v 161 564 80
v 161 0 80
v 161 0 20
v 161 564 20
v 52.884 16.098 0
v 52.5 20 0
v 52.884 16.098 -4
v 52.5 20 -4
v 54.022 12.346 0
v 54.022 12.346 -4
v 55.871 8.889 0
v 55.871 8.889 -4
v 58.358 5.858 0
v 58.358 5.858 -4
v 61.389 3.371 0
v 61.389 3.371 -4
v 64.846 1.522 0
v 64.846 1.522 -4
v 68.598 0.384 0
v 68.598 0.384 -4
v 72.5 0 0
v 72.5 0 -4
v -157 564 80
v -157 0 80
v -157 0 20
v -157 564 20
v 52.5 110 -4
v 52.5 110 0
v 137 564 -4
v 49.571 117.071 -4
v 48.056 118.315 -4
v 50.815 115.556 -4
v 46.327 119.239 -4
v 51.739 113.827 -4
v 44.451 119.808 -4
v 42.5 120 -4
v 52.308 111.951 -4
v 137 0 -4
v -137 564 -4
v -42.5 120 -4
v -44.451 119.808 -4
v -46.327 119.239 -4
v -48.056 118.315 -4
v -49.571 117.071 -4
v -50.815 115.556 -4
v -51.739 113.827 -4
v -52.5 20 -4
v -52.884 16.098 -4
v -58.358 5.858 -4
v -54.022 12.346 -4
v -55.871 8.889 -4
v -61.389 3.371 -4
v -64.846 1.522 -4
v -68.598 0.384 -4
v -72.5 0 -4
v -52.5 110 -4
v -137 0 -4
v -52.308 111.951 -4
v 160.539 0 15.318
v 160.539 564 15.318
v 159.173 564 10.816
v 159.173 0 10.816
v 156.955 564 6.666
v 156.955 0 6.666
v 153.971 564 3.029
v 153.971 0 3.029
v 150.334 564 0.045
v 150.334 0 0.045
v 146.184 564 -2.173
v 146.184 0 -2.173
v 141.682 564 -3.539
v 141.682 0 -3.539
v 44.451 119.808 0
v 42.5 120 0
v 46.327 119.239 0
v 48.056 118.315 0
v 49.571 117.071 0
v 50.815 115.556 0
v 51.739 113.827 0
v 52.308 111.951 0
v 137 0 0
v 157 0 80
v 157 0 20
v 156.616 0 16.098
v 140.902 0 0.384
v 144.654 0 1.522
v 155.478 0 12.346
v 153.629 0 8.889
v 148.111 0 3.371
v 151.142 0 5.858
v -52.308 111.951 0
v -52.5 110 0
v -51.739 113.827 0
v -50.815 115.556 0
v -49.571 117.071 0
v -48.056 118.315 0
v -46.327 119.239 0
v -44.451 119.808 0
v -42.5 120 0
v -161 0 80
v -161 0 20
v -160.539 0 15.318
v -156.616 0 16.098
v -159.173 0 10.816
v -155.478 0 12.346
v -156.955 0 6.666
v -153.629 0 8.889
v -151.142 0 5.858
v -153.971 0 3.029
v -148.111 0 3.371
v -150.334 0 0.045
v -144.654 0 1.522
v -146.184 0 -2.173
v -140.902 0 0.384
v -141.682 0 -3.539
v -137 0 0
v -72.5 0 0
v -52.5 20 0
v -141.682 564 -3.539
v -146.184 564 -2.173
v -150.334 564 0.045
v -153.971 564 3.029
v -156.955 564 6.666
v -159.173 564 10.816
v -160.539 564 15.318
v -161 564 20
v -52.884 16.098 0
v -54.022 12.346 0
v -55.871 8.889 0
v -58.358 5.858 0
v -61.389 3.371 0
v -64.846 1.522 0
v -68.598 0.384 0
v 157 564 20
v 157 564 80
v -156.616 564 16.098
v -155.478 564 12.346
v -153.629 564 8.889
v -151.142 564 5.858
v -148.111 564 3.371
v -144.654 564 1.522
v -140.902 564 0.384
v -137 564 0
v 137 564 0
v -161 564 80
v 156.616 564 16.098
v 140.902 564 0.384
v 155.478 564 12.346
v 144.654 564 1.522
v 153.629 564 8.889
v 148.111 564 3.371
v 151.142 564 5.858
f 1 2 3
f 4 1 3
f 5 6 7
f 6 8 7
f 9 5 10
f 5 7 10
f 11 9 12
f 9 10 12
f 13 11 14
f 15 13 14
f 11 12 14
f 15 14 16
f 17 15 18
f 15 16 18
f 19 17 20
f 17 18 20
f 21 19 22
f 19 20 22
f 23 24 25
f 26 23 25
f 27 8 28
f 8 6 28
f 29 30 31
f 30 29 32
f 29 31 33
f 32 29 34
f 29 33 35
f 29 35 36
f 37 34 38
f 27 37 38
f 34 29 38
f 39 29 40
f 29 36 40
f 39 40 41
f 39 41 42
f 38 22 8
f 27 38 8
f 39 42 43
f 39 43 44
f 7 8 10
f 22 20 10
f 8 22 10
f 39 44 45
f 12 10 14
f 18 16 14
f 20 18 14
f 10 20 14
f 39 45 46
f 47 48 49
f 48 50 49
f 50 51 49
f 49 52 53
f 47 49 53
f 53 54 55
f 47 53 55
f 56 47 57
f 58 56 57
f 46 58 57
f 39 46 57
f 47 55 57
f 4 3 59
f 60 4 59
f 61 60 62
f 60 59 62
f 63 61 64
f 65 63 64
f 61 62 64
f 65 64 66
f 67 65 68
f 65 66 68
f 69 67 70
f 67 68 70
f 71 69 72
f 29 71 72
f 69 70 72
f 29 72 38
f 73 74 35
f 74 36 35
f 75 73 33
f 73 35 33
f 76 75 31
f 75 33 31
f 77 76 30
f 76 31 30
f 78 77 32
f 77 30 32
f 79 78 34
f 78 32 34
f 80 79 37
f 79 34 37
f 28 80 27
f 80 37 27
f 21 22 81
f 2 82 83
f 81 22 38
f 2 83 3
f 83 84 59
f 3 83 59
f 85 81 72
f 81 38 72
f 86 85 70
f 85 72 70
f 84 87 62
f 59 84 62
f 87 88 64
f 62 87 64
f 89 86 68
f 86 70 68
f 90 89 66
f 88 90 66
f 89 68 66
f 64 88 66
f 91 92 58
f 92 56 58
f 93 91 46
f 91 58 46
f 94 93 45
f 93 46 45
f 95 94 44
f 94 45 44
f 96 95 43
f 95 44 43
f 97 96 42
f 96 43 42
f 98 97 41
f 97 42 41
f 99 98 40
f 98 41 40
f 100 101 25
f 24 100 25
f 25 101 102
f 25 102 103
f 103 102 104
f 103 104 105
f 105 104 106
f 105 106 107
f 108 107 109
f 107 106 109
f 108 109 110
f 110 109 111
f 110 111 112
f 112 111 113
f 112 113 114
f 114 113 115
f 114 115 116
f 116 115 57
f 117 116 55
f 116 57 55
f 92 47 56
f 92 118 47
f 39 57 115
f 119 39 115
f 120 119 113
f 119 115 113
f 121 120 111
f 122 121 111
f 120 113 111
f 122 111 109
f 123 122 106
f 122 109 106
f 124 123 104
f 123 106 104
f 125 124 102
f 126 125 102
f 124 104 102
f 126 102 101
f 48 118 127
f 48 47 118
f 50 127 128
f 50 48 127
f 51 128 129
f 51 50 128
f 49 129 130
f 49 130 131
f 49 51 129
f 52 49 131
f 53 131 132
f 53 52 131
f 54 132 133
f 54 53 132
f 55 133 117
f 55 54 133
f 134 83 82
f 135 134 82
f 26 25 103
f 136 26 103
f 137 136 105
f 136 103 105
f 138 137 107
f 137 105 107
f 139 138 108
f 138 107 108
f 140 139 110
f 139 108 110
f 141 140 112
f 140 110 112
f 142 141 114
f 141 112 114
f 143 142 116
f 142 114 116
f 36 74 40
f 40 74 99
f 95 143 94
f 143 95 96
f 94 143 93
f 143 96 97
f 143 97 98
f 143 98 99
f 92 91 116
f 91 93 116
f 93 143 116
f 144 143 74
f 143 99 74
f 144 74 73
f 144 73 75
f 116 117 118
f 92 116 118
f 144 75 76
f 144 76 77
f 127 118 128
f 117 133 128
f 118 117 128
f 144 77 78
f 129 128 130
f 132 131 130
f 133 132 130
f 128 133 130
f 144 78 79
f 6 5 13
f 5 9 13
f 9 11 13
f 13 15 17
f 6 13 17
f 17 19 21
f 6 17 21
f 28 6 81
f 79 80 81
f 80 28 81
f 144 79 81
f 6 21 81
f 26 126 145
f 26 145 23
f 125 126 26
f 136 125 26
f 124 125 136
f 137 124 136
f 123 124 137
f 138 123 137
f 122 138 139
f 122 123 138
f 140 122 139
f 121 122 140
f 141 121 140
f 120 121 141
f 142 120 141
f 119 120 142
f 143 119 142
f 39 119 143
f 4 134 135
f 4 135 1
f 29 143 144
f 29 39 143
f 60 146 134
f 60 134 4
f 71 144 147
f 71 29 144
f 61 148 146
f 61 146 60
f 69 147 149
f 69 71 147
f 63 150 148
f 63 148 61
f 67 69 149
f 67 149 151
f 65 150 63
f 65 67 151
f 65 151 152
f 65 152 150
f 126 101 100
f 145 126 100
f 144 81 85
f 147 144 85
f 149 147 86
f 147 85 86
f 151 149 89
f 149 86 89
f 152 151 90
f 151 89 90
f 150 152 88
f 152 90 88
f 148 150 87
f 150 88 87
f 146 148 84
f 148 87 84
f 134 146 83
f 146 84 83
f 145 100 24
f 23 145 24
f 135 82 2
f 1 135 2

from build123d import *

# Parameters (mm, degrees)
EXTRUDE_THIN1_DEPTH     = 564
CUT_EXTRUDE1_DEPTH      = 593.514134852
CUT_EXTRUDE1_DEPTH_BACK = 593.514134852
SKETCH2_W               = 105
SKETCH2_H               = 260.267111285
FILLET2_R               = 10
FILLET3_R               = 20


with BuildPart() as part:
    # Sketch1 → Extrude-Thin1 (new body)
    with BuildSketch(Plane(origin=(0, 0, 0), x_dir=(1, 0, 0), z_dir=(0, 1, 0))):
        with BuildLine():
            Line((-157, -80), (-157, -20))
            ThreePointArc((-157, -20), (-151.142135624, -5.857864376), (-137, 0))
            Line((-137, 0), (137, 0))
            ThreePointArc((137, 0), (151.142135624, -5.857864376), (157, -20))
            Line((157, -20), (157, -80))
            Line((157, -80), (161, -80))
            Line((161, -80), (161, -20))
            ThreePointArc((161, -20), (153.970562748, -3.029437252), (137, 4))
            Line((137, 4), (-137, 4))
            ThreePointArc((-137, 4), (-153.970562748, -3.029437252), (-161, -20))
            Line((-161, -20), (-161, -80))
            Line((-161, -80), (-157, -80))
        make_face()
    extrude(amount=EXTRUDE_THIN1_DEPTH)

    # Sketch2 → Cut-Extrude1 (cut, two sides: drawn at the far end of the back side and taken through both)
    with BuildSketch(Plane(origin=(0, 0, -4), x_dir=(-1, 0, 0), z_dir=(0, 0, -1)).offset(-CUT_EXTRUDE1_DEPTH_BACK)):
        with Locations((0, -10.133555642)):
            Rectangle(SKETCH2_W, SKETCH2_H)
    extrude(amount=CUT_EXTRUDE1_DEPTH + CUT_EXTRUDE1_DEPTH_BACK, mode=Mode.SUBTRACT)

    # Fillet2
    fillet2_edges = [part.edges().sort_by_distance(p)[0] for p in [
        (52.5, 120, -2),
        (-52.5, 120, -2),
    ]]
    fillet(fillet2_edges, radius=FILLET2_R)

    # Fillet3
    fillet3_edges = [part.edges().sort_by_distance(p)[0] for p in [
        (-52.5, 0, -2),
        (52.5, 0, -2),
    ]]
    fillet(fillet3_edges, radius=FILLET3_R)


solid = part.part
